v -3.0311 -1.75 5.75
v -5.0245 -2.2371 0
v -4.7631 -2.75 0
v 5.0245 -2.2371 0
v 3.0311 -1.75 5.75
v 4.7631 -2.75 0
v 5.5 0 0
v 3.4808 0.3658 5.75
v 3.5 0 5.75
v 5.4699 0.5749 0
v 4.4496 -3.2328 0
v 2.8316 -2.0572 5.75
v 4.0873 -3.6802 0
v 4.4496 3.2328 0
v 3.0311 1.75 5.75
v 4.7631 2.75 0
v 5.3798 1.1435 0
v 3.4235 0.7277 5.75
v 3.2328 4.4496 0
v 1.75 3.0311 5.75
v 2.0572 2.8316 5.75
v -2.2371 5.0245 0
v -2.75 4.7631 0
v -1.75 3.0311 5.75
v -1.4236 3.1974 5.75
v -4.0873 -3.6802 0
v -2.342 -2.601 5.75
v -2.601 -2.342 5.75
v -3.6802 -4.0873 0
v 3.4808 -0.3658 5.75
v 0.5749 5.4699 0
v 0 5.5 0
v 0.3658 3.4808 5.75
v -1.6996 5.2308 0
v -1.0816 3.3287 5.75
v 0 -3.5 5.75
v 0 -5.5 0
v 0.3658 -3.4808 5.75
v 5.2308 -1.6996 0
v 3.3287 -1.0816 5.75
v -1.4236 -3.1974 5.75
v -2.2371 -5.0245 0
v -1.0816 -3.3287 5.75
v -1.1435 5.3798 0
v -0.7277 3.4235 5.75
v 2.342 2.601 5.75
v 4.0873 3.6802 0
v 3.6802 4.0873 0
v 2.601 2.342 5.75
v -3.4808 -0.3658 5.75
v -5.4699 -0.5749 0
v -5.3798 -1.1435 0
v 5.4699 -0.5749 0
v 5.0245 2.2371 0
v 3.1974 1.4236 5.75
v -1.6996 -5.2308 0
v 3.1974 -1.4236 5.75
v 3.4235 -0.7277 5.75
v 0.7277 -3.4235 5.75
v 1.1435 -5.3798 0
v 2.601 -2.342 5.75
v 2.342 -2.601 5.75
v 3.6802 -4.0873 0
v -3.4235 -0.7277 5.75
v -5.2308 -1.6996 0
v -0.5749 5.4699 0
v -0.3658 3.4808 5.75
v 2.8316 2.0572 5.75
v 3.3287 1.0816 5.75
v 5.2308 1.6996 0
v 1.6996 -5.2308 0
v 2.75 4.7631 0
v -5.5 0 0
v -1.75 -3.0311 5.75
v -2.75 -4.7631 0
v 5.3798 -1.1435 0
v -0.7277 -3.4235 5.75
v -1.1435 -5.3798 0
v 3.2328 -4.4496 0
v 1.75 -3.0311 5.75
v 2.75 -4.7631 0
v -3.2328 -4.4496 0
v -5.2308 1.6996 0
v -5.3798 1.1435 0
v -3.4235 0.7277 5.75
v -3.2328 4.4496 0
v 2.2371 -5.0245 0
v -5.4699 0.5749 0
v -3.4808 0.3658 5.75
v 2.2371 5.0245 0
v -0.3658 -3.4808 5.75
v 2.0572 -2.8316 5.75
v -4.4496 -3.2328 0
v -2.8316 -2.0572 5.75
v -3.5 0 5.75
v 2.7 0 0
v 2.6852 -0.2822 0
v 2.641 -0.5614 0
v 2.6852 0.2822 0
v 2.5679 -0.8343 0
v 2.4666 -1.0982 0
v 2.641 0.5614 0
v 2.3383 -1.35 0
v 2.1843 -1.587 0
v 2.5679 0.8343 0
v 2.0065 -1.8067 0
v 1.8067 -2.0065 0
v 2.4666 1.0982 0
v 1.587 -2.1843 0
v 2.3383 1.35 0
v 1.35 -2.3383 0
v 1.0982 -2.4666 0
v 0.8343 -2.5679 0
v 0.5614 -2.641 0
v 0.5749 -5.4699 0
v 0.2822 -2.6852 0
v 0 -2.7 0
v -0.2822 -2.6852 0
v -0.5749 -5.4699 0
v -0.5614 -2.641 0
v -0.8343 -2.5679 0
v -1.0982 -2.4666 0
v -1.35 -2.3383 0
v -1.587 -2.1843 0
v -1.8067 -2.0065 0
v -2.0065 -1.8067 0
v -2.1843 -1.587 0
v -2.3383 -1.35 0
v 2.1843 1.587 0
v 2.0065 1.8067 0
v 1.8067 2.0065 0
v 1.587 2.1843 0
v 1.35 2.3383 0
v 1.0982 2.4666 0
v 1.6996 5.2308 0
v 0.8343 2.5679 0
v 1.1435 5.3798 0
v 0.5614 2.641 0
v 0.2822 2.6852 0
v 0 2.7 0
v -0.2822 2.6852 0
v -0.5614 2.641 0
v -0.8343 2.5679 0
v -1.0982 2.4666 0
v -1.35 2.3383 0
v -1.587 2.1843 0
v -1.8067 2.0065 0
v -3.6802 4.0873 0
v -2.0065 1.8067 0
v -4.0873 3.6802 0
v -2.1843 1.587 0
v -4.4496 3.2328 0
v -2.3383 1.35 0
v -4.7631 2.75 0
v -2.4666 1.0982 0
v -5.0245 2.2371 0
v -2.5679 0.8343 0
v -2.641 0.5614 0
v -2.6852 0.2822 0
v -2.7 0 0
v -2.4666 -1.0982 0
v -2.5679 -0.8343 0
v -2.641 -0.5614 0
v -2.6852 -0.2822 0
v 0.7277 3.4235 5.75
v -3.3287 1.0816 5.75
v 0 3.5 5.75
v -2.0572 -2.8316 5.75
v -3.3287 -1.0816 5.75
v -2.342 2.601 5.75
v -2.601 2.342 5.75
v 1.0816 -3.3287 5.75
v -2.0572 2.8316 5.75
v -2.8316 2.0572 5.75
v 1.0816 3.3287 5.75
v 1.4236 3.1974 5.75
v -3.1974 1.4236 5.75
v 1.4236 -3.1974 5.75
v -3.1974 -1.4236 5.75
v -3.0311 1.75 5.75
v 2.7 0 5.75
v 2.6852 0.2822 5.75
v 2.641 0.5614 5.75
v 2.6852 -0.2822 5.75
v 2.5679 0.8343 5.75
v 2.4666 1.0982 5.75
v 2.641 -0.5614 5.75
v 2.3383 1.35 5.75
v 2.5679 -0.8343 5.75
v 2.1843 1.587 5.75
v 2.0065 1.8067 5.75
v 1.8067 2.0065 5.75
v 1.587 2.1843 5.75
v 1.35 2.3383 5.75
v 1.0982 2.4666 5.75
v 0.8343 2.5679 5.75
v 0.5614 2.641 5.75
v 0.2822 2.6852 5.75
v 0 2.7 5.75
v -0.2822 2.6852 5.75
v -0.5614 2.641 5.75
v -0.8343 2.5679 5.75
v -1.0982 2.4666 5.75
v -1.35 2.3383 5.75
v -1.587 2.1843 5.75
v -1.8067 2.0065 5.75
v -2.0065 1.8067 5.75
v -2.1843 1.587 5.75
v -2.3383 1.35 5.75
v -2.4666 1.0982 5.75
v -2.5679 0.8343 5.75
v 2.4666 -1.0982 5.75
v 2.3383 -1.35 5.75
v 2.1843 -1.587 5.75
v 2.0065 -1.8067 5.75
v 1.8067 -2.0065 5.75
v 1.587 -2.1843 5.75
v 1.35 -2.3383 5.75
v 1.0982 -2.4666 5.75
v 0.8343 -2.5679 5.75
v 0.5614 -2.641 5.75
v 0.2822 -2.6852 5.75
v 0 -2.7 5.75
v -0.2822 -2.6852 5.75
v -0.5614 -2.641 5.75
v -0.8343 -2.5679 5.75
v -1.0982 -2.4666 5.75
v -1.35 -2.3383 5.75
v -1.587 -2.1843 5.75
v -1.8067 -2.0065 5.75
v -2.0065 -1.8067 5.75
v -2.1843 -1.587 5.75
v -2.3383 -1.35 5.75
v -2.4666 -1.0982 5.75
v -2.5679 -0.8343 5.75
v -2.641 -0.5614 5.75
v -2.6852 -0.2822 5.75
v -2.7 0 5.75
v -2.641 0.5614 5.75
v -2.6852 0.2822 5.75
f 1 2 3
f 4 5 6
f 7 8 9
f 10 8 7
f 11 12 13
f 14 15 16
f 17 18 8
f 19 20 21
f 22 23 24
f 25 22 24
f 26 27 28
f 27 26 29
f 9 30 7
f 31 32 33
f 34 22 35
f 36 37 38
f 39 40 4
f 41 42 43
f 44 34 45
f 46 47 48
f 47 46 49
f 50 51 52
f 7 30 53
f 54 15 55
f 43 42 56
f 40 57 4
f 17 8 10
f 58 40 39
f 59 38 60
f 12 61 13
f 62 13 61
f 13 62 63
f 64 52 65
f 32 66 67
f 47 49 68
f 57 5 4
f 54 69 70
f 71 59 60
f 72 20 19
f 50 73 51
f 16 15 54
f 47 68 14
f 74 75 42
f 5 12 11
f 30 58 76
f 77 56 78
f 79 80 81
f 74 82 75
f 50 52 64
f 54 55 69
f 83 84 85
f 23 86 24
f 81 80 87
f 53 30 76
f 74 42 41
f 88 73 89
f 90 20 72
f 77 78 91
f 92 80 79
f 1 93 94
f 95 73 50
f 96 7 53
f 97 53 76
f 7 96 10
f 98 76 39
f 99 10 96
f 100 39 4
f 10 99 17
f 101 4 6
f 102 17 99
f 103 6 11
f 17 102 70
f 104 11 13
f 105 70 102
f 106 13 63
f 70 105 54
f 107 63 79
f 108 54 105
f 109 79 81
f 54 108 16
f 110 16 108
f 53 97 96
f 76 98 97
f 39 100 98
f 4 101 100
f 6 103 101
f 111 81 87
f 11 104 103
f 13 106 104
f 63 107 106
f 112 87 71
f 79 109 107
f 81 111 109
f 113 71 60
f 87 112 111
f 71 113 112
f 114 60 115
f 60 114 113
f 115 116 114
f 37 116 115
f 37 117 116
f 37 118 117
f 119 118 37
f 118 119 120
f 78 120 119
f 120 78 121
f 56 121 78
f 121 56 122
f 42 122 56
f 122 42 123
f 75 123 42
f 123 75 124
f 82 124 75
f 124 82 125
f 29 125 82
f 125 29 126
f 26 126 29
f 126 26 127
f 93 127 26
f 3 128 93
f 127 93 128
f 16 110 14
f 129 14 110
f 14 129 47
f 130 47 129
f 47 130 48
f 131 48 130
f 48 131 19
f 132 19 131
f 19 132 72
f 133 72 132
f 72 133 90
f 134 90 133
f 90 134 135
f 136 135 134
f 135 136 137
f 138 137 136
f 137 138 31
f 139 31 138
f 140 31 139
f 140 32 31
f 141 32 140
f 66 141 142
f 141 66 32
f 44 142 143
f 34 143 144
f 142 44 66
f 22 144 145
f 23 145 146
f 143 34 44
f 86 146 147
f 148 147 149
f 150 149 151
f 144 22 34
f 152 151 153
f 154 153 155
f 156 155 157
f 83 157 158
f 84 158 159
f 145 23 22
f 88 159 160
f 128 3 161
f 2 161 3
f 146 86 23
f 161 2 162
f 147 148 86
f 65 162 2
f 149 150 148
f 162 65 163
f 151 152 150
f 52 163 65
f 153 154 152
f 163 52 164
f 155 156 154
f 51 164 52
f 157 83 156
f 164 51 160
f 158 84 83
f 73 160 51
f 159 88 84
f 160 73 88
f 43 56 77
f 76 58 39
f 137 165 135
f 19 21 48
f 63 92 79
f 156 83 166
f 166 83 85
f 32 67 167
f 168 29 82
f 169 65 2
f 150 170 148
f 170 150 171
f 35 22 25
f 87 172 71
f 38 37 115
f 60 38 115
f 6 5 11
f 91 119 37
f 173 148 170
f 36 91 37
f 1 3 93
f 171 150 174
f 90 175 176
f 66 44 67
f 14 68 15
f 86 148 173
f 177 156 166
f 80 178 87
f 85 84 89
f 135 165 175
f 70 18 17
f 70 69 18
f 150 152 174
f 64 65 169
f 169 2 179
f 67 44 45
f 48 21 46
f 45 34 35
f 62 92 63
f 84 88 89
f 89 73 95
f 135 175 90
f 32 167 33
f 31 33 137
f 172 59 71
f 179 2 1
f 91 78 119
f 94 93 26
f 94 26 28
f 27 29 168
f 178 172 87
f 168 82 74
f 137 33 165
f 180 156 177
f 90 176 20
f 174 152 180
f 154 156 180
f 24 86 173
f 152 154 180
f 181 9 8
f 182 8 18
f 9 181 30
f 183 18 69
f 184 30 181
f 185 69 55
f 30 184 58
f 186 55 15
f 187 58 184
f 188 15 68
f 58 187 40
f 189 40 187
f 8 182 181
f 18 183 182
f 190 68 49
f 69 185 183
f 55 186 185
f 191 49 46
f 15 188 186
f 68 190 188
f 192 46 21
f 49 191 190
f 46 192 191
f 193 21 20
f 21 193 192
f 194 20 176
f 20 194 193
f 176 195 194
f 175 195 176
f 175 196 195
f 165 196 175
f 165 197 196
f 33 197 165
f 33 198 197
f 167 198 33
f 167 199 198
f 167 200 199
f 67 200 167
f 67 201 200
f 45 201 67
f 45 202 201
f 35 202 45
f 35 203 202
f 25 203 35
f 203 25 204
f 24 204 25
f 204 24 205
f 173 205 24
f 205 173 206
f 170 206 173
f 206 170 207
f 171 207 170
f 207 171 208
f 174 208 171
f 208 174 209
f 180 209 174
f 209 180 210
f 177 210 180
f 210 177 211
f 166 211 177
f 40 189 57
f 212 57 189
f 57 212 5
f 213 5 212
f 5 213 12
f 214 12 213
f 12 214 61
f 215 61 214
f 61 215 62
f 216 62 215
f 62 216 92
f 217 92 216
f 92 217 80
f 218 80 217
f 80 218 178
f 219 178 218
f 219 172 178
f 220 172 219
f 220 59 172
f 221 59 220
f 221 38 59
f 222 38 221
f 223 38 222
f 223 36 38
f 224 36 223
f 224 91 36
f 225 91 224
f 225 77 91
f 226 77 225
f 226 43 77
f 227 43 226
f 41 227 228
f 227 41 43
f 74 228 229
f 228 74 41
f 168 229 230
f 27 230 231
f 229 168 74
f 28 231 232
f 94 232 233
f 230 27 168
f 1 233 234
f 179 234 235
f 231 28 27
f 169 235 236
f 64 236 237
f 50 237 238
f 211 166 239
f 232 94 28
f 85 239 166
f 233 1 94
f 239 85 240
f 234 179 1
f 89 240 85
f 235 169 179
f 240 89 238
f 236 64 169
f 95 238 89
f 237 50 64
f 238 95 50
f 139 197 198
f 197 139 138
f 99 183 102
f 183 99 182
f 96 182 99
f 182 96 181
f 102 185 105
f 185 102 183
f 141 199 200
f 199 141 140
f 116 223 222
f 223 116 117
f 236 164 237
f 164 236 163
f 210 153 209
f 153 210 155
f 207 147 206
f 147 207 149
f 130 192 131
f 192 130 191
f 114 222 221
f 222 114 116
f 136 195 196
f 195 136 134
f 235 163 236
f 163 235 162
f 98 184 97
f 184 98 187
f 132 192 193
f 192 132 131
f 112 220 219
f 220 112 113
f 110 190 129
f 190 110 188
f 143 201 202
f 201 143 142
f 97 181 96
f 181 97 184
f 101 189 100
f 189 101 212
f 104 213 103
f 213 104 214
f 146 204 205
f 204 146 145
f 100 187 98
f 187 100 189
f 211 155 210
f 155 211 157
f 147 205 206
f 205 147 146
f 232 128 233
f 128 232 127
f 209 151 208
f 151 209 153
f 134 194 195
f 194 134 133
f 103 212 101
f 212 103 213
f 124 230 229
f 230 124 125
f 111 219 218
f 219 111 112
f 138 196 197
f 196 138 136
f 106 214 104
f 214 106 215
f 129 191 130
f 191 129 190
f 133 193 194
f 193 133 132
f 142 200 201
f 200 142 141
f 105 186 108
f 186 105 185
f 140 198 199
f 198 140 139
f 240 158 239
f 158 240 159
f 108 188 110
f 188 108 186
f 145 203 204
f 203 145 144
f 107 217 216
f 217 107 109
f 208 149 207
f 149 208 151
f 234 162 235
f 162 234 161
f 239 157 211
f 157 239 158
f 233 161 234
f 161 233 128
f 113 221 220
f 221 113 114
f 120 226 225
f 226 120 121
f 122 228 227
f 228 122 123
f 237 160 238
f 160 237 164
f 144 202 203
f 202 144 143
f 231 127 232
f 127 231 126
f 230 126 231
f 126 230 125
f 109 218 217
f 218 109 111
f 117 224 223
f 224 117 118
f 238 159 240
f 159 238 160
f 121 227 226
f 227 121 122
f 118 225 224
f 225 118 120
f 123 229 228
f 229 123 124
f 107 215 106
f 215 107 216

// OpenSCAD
epaisseur_poulie = 8.5  ;
dia_ext= 7; 
dia_int = 5.4;
eps = 0.01; 

hauteur = 20 / 2 - epaisseur_poulie / 2 ;
$fn= 60;

module entretoise(){
        difference(){
        cylinder(h= hauteur , r2 = dia_ext/2, r1=(dia_ext+4)/2);
        translate([0, 0, -eps/2]) 
        cylinder(h= hauteur+eps, r = dia_int/2);
    
        }
};


entretoise();
